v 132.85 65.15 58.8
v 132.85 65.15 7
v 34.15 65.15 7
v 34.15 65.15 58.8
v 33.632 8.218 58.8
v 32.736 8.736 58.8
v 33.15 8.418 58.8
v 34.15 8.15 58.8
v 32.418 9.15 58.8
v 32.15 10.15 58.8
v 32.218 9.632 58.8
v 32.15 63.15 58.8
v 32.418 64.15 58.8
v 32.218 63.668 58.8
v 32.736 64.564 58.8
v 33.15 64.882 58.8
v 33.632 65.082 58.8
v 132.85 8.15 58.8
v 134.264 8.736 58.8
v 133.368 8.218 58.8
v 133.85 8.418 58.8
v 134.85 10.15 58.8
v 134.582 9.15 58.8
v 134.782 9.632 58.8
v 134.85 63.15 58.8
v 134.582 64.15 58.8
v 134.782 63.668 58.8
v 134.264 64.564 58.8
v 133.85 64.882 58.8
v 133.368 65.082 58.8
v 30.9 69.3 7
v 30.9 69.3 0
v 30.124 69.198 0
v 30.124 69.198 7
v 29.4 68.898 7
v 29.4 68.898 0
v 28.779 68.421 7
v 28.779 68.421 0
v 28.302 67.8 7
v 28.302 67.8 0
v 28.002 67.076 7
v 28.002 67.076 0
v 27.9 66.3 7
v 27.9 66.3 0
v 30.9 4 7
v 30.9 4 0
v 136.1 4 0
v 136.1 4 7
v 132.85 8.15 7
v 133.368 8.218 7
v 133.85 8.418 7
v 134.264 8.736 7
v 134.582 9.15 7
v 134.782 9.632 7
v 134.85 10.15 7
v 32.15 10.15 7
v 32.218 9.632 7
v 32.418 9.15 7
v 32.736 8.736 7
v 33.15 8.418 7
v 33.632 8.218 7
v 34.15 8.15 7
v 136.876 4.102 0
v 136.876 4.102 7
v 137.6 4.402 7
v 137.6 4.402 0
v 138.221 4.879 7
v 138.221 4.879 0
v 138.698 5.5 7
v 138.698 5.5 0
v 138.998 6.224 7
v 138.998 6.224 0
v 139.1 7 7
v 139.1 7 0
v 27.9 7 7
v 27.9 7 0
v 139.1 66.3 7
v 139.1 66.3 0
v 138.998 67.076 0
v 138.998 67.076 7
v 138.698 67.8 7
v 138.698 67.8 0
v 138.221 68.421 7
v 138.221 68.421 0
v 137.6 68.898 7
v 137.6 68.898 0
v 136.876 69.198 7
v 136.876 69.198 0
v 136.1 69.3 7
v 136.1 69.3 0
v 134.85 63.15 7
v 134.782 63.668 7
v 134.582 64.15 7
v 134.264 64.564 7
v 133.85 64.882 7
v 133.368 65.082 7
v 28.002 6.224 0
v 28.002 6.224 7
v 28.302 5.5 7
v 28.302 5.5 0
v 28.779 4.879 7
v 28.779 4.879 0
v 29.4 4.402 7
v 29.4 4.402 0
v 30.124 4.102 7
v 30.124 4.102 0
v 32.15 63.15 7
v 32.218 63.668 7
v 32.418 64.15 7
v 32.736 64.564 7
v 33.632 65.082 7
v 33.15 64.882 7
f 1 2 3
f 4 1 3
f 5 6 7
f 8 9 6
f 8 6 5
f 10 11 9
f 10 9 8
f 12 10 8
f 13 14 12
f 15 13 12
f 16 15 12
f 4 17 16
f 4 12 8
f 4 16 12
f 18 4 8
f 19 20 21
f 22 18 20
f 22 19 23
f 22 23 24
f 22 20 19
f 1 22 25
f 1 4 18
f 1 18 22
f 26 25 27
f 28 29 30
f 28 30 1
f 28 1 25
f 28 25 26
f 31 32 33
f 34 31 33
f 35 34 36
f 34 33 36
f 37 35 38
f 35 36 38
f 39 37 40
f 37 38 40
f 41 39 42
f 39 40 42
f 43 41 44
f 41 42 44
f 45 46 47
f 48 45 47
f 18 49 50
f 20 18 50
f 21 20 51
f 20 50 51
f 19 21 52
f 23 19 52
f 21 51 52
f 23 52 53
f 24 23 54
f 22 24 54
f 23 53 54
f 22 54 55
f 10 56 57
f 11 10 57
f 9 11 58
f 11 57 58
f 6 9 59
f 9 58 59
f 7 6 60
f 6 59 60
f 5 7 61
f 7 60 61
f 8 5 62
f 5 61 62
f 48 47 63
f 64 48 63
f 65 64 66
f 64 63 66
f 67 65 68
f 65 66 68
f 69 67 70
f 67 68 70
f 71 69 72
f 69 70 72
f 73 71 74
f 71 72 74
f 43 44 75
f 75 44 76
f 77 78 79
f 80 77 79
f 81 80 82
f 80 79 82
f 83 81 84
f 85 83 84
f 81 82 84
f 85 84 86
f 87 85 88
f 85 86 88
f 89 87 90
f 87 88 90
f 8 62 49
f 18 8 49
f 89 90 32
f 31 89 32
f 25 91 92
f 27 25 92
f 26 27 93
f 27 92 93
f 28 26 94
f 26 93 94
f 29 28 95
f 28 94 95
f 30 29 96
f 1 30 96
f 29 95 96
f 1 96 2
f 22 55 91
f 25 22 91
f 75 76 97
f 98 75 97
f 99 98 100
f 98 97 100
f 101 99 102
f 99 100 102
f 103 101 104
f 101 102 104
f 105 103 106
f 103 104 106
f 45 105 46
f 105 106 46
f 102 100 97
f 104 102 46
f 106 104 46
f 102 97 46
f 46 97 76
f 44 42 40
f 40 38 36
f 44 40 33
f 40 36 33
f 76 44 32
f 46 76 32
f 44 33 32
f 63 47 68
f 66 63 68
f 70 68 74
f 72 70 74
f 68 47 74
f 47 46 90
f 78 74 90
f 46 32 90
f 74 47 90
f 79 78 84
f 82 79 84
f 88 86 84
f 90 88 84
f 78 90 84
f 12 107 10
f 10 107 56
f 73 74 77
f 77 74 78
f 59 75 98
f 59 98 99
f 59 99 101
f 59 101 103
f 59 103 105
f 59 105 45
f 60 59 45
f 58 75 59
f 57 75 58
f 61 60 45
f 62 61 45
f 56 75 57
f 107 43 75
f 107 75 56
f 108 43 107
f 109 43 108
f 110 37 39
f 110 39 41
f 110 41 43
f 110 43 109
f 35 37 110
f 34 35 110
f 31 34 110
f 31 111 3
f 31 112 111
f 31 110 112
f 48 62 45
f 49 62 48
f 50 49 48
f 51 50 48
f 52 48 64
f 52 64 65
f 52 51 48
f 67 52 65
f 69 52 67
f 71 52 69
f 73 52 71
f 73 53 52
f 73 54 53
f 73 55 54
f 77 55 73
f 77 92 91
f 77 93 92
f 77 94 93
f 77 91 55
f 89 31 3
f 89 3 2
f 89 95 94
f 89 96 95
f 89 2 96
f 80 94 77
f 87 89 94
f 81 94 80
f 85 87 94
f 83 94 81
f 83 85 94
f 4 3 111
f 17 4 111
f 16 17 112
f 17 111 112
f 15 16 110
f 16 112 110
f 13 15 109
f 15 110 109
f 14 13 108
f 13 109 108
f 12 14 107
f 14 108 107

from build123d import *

# Parameters (mm, degrees)
V09_H_BODY102P7X57_FROM_NEW_MANUAL_START = 7
V09_H_BODY102P7X57_FROM_NEW_MANUAL_DEPTH = 51.8
V09_H_FLANGE111P2X65P3_DEPTH7_DEPTH      = 7


with BuildPart() as part:
    # 草图5 → V09_H_body102p7x57_from_new_manual (new body)
    with BuildSketch(Plane.XY.offset(V09_H_BODY102P7X57_FROM_NEW_MANUAL_START)):
        with BuildLine():
            Line((34.15, 8.15), (132.85, 8.15))
            ThreePointArc((132.85, 8.15), (134.264213562, 8.735786438), (134.85, 10.15))
            Line((134.85, 10.15), (134.85, 63.15))
            ThreePointArc((134.85, 63.15), (134.264213562, 64.564213562), (132.85, 65.15))
            Line((132.85, 65.15), (34.15, 65.15))
            ThreePointArc((34.15, 65.15), (32.735786438, 64.564213562), (32.15, 63.15))
            Line((32.15, 63.15), (32.15, 10.15))
            ThreePointArc((32.15, 10.15), (32.735786438, 8.735786438), (34.15, 8.15))
        make_face()
    extrude(amount=V09_H_BODY102P7X57_FROM_NEW_MANUAL_DEPTH)

    # 草图6 → V09_H_flange111p2x65p3_depth7 (add)
    with BuildSketch(Plane.XY):
        with BuildLine():
            Line((30.9, 4), (136.1, 4))
            ThreePointArc((136.1, 4), (138.221320344, 4.878679656), (139.1, 7))
            Line((139.1, 7), (139.1, 66.3))
            ThreePointArc((139.1, 66.3), (138.221320344, 68.421320344), (136.1, 69.3))
            Line((136.1, 69.3), (30.9, 69.3))
            ThreePointArc((30.9, 69.3), (28.778679656, 68.421320344), (27.9, 66.3))
            Line((27.9, 66.3), (27.9, 7))
            ThreePointArc((27.9, 7), (28.778679656, 4.878679656), (30.9, 4))
        make_face()
    extrude(amount=V09_H_FLANGE111P2X65P3_DEPTH7_DEPTH)


solid = part.part
